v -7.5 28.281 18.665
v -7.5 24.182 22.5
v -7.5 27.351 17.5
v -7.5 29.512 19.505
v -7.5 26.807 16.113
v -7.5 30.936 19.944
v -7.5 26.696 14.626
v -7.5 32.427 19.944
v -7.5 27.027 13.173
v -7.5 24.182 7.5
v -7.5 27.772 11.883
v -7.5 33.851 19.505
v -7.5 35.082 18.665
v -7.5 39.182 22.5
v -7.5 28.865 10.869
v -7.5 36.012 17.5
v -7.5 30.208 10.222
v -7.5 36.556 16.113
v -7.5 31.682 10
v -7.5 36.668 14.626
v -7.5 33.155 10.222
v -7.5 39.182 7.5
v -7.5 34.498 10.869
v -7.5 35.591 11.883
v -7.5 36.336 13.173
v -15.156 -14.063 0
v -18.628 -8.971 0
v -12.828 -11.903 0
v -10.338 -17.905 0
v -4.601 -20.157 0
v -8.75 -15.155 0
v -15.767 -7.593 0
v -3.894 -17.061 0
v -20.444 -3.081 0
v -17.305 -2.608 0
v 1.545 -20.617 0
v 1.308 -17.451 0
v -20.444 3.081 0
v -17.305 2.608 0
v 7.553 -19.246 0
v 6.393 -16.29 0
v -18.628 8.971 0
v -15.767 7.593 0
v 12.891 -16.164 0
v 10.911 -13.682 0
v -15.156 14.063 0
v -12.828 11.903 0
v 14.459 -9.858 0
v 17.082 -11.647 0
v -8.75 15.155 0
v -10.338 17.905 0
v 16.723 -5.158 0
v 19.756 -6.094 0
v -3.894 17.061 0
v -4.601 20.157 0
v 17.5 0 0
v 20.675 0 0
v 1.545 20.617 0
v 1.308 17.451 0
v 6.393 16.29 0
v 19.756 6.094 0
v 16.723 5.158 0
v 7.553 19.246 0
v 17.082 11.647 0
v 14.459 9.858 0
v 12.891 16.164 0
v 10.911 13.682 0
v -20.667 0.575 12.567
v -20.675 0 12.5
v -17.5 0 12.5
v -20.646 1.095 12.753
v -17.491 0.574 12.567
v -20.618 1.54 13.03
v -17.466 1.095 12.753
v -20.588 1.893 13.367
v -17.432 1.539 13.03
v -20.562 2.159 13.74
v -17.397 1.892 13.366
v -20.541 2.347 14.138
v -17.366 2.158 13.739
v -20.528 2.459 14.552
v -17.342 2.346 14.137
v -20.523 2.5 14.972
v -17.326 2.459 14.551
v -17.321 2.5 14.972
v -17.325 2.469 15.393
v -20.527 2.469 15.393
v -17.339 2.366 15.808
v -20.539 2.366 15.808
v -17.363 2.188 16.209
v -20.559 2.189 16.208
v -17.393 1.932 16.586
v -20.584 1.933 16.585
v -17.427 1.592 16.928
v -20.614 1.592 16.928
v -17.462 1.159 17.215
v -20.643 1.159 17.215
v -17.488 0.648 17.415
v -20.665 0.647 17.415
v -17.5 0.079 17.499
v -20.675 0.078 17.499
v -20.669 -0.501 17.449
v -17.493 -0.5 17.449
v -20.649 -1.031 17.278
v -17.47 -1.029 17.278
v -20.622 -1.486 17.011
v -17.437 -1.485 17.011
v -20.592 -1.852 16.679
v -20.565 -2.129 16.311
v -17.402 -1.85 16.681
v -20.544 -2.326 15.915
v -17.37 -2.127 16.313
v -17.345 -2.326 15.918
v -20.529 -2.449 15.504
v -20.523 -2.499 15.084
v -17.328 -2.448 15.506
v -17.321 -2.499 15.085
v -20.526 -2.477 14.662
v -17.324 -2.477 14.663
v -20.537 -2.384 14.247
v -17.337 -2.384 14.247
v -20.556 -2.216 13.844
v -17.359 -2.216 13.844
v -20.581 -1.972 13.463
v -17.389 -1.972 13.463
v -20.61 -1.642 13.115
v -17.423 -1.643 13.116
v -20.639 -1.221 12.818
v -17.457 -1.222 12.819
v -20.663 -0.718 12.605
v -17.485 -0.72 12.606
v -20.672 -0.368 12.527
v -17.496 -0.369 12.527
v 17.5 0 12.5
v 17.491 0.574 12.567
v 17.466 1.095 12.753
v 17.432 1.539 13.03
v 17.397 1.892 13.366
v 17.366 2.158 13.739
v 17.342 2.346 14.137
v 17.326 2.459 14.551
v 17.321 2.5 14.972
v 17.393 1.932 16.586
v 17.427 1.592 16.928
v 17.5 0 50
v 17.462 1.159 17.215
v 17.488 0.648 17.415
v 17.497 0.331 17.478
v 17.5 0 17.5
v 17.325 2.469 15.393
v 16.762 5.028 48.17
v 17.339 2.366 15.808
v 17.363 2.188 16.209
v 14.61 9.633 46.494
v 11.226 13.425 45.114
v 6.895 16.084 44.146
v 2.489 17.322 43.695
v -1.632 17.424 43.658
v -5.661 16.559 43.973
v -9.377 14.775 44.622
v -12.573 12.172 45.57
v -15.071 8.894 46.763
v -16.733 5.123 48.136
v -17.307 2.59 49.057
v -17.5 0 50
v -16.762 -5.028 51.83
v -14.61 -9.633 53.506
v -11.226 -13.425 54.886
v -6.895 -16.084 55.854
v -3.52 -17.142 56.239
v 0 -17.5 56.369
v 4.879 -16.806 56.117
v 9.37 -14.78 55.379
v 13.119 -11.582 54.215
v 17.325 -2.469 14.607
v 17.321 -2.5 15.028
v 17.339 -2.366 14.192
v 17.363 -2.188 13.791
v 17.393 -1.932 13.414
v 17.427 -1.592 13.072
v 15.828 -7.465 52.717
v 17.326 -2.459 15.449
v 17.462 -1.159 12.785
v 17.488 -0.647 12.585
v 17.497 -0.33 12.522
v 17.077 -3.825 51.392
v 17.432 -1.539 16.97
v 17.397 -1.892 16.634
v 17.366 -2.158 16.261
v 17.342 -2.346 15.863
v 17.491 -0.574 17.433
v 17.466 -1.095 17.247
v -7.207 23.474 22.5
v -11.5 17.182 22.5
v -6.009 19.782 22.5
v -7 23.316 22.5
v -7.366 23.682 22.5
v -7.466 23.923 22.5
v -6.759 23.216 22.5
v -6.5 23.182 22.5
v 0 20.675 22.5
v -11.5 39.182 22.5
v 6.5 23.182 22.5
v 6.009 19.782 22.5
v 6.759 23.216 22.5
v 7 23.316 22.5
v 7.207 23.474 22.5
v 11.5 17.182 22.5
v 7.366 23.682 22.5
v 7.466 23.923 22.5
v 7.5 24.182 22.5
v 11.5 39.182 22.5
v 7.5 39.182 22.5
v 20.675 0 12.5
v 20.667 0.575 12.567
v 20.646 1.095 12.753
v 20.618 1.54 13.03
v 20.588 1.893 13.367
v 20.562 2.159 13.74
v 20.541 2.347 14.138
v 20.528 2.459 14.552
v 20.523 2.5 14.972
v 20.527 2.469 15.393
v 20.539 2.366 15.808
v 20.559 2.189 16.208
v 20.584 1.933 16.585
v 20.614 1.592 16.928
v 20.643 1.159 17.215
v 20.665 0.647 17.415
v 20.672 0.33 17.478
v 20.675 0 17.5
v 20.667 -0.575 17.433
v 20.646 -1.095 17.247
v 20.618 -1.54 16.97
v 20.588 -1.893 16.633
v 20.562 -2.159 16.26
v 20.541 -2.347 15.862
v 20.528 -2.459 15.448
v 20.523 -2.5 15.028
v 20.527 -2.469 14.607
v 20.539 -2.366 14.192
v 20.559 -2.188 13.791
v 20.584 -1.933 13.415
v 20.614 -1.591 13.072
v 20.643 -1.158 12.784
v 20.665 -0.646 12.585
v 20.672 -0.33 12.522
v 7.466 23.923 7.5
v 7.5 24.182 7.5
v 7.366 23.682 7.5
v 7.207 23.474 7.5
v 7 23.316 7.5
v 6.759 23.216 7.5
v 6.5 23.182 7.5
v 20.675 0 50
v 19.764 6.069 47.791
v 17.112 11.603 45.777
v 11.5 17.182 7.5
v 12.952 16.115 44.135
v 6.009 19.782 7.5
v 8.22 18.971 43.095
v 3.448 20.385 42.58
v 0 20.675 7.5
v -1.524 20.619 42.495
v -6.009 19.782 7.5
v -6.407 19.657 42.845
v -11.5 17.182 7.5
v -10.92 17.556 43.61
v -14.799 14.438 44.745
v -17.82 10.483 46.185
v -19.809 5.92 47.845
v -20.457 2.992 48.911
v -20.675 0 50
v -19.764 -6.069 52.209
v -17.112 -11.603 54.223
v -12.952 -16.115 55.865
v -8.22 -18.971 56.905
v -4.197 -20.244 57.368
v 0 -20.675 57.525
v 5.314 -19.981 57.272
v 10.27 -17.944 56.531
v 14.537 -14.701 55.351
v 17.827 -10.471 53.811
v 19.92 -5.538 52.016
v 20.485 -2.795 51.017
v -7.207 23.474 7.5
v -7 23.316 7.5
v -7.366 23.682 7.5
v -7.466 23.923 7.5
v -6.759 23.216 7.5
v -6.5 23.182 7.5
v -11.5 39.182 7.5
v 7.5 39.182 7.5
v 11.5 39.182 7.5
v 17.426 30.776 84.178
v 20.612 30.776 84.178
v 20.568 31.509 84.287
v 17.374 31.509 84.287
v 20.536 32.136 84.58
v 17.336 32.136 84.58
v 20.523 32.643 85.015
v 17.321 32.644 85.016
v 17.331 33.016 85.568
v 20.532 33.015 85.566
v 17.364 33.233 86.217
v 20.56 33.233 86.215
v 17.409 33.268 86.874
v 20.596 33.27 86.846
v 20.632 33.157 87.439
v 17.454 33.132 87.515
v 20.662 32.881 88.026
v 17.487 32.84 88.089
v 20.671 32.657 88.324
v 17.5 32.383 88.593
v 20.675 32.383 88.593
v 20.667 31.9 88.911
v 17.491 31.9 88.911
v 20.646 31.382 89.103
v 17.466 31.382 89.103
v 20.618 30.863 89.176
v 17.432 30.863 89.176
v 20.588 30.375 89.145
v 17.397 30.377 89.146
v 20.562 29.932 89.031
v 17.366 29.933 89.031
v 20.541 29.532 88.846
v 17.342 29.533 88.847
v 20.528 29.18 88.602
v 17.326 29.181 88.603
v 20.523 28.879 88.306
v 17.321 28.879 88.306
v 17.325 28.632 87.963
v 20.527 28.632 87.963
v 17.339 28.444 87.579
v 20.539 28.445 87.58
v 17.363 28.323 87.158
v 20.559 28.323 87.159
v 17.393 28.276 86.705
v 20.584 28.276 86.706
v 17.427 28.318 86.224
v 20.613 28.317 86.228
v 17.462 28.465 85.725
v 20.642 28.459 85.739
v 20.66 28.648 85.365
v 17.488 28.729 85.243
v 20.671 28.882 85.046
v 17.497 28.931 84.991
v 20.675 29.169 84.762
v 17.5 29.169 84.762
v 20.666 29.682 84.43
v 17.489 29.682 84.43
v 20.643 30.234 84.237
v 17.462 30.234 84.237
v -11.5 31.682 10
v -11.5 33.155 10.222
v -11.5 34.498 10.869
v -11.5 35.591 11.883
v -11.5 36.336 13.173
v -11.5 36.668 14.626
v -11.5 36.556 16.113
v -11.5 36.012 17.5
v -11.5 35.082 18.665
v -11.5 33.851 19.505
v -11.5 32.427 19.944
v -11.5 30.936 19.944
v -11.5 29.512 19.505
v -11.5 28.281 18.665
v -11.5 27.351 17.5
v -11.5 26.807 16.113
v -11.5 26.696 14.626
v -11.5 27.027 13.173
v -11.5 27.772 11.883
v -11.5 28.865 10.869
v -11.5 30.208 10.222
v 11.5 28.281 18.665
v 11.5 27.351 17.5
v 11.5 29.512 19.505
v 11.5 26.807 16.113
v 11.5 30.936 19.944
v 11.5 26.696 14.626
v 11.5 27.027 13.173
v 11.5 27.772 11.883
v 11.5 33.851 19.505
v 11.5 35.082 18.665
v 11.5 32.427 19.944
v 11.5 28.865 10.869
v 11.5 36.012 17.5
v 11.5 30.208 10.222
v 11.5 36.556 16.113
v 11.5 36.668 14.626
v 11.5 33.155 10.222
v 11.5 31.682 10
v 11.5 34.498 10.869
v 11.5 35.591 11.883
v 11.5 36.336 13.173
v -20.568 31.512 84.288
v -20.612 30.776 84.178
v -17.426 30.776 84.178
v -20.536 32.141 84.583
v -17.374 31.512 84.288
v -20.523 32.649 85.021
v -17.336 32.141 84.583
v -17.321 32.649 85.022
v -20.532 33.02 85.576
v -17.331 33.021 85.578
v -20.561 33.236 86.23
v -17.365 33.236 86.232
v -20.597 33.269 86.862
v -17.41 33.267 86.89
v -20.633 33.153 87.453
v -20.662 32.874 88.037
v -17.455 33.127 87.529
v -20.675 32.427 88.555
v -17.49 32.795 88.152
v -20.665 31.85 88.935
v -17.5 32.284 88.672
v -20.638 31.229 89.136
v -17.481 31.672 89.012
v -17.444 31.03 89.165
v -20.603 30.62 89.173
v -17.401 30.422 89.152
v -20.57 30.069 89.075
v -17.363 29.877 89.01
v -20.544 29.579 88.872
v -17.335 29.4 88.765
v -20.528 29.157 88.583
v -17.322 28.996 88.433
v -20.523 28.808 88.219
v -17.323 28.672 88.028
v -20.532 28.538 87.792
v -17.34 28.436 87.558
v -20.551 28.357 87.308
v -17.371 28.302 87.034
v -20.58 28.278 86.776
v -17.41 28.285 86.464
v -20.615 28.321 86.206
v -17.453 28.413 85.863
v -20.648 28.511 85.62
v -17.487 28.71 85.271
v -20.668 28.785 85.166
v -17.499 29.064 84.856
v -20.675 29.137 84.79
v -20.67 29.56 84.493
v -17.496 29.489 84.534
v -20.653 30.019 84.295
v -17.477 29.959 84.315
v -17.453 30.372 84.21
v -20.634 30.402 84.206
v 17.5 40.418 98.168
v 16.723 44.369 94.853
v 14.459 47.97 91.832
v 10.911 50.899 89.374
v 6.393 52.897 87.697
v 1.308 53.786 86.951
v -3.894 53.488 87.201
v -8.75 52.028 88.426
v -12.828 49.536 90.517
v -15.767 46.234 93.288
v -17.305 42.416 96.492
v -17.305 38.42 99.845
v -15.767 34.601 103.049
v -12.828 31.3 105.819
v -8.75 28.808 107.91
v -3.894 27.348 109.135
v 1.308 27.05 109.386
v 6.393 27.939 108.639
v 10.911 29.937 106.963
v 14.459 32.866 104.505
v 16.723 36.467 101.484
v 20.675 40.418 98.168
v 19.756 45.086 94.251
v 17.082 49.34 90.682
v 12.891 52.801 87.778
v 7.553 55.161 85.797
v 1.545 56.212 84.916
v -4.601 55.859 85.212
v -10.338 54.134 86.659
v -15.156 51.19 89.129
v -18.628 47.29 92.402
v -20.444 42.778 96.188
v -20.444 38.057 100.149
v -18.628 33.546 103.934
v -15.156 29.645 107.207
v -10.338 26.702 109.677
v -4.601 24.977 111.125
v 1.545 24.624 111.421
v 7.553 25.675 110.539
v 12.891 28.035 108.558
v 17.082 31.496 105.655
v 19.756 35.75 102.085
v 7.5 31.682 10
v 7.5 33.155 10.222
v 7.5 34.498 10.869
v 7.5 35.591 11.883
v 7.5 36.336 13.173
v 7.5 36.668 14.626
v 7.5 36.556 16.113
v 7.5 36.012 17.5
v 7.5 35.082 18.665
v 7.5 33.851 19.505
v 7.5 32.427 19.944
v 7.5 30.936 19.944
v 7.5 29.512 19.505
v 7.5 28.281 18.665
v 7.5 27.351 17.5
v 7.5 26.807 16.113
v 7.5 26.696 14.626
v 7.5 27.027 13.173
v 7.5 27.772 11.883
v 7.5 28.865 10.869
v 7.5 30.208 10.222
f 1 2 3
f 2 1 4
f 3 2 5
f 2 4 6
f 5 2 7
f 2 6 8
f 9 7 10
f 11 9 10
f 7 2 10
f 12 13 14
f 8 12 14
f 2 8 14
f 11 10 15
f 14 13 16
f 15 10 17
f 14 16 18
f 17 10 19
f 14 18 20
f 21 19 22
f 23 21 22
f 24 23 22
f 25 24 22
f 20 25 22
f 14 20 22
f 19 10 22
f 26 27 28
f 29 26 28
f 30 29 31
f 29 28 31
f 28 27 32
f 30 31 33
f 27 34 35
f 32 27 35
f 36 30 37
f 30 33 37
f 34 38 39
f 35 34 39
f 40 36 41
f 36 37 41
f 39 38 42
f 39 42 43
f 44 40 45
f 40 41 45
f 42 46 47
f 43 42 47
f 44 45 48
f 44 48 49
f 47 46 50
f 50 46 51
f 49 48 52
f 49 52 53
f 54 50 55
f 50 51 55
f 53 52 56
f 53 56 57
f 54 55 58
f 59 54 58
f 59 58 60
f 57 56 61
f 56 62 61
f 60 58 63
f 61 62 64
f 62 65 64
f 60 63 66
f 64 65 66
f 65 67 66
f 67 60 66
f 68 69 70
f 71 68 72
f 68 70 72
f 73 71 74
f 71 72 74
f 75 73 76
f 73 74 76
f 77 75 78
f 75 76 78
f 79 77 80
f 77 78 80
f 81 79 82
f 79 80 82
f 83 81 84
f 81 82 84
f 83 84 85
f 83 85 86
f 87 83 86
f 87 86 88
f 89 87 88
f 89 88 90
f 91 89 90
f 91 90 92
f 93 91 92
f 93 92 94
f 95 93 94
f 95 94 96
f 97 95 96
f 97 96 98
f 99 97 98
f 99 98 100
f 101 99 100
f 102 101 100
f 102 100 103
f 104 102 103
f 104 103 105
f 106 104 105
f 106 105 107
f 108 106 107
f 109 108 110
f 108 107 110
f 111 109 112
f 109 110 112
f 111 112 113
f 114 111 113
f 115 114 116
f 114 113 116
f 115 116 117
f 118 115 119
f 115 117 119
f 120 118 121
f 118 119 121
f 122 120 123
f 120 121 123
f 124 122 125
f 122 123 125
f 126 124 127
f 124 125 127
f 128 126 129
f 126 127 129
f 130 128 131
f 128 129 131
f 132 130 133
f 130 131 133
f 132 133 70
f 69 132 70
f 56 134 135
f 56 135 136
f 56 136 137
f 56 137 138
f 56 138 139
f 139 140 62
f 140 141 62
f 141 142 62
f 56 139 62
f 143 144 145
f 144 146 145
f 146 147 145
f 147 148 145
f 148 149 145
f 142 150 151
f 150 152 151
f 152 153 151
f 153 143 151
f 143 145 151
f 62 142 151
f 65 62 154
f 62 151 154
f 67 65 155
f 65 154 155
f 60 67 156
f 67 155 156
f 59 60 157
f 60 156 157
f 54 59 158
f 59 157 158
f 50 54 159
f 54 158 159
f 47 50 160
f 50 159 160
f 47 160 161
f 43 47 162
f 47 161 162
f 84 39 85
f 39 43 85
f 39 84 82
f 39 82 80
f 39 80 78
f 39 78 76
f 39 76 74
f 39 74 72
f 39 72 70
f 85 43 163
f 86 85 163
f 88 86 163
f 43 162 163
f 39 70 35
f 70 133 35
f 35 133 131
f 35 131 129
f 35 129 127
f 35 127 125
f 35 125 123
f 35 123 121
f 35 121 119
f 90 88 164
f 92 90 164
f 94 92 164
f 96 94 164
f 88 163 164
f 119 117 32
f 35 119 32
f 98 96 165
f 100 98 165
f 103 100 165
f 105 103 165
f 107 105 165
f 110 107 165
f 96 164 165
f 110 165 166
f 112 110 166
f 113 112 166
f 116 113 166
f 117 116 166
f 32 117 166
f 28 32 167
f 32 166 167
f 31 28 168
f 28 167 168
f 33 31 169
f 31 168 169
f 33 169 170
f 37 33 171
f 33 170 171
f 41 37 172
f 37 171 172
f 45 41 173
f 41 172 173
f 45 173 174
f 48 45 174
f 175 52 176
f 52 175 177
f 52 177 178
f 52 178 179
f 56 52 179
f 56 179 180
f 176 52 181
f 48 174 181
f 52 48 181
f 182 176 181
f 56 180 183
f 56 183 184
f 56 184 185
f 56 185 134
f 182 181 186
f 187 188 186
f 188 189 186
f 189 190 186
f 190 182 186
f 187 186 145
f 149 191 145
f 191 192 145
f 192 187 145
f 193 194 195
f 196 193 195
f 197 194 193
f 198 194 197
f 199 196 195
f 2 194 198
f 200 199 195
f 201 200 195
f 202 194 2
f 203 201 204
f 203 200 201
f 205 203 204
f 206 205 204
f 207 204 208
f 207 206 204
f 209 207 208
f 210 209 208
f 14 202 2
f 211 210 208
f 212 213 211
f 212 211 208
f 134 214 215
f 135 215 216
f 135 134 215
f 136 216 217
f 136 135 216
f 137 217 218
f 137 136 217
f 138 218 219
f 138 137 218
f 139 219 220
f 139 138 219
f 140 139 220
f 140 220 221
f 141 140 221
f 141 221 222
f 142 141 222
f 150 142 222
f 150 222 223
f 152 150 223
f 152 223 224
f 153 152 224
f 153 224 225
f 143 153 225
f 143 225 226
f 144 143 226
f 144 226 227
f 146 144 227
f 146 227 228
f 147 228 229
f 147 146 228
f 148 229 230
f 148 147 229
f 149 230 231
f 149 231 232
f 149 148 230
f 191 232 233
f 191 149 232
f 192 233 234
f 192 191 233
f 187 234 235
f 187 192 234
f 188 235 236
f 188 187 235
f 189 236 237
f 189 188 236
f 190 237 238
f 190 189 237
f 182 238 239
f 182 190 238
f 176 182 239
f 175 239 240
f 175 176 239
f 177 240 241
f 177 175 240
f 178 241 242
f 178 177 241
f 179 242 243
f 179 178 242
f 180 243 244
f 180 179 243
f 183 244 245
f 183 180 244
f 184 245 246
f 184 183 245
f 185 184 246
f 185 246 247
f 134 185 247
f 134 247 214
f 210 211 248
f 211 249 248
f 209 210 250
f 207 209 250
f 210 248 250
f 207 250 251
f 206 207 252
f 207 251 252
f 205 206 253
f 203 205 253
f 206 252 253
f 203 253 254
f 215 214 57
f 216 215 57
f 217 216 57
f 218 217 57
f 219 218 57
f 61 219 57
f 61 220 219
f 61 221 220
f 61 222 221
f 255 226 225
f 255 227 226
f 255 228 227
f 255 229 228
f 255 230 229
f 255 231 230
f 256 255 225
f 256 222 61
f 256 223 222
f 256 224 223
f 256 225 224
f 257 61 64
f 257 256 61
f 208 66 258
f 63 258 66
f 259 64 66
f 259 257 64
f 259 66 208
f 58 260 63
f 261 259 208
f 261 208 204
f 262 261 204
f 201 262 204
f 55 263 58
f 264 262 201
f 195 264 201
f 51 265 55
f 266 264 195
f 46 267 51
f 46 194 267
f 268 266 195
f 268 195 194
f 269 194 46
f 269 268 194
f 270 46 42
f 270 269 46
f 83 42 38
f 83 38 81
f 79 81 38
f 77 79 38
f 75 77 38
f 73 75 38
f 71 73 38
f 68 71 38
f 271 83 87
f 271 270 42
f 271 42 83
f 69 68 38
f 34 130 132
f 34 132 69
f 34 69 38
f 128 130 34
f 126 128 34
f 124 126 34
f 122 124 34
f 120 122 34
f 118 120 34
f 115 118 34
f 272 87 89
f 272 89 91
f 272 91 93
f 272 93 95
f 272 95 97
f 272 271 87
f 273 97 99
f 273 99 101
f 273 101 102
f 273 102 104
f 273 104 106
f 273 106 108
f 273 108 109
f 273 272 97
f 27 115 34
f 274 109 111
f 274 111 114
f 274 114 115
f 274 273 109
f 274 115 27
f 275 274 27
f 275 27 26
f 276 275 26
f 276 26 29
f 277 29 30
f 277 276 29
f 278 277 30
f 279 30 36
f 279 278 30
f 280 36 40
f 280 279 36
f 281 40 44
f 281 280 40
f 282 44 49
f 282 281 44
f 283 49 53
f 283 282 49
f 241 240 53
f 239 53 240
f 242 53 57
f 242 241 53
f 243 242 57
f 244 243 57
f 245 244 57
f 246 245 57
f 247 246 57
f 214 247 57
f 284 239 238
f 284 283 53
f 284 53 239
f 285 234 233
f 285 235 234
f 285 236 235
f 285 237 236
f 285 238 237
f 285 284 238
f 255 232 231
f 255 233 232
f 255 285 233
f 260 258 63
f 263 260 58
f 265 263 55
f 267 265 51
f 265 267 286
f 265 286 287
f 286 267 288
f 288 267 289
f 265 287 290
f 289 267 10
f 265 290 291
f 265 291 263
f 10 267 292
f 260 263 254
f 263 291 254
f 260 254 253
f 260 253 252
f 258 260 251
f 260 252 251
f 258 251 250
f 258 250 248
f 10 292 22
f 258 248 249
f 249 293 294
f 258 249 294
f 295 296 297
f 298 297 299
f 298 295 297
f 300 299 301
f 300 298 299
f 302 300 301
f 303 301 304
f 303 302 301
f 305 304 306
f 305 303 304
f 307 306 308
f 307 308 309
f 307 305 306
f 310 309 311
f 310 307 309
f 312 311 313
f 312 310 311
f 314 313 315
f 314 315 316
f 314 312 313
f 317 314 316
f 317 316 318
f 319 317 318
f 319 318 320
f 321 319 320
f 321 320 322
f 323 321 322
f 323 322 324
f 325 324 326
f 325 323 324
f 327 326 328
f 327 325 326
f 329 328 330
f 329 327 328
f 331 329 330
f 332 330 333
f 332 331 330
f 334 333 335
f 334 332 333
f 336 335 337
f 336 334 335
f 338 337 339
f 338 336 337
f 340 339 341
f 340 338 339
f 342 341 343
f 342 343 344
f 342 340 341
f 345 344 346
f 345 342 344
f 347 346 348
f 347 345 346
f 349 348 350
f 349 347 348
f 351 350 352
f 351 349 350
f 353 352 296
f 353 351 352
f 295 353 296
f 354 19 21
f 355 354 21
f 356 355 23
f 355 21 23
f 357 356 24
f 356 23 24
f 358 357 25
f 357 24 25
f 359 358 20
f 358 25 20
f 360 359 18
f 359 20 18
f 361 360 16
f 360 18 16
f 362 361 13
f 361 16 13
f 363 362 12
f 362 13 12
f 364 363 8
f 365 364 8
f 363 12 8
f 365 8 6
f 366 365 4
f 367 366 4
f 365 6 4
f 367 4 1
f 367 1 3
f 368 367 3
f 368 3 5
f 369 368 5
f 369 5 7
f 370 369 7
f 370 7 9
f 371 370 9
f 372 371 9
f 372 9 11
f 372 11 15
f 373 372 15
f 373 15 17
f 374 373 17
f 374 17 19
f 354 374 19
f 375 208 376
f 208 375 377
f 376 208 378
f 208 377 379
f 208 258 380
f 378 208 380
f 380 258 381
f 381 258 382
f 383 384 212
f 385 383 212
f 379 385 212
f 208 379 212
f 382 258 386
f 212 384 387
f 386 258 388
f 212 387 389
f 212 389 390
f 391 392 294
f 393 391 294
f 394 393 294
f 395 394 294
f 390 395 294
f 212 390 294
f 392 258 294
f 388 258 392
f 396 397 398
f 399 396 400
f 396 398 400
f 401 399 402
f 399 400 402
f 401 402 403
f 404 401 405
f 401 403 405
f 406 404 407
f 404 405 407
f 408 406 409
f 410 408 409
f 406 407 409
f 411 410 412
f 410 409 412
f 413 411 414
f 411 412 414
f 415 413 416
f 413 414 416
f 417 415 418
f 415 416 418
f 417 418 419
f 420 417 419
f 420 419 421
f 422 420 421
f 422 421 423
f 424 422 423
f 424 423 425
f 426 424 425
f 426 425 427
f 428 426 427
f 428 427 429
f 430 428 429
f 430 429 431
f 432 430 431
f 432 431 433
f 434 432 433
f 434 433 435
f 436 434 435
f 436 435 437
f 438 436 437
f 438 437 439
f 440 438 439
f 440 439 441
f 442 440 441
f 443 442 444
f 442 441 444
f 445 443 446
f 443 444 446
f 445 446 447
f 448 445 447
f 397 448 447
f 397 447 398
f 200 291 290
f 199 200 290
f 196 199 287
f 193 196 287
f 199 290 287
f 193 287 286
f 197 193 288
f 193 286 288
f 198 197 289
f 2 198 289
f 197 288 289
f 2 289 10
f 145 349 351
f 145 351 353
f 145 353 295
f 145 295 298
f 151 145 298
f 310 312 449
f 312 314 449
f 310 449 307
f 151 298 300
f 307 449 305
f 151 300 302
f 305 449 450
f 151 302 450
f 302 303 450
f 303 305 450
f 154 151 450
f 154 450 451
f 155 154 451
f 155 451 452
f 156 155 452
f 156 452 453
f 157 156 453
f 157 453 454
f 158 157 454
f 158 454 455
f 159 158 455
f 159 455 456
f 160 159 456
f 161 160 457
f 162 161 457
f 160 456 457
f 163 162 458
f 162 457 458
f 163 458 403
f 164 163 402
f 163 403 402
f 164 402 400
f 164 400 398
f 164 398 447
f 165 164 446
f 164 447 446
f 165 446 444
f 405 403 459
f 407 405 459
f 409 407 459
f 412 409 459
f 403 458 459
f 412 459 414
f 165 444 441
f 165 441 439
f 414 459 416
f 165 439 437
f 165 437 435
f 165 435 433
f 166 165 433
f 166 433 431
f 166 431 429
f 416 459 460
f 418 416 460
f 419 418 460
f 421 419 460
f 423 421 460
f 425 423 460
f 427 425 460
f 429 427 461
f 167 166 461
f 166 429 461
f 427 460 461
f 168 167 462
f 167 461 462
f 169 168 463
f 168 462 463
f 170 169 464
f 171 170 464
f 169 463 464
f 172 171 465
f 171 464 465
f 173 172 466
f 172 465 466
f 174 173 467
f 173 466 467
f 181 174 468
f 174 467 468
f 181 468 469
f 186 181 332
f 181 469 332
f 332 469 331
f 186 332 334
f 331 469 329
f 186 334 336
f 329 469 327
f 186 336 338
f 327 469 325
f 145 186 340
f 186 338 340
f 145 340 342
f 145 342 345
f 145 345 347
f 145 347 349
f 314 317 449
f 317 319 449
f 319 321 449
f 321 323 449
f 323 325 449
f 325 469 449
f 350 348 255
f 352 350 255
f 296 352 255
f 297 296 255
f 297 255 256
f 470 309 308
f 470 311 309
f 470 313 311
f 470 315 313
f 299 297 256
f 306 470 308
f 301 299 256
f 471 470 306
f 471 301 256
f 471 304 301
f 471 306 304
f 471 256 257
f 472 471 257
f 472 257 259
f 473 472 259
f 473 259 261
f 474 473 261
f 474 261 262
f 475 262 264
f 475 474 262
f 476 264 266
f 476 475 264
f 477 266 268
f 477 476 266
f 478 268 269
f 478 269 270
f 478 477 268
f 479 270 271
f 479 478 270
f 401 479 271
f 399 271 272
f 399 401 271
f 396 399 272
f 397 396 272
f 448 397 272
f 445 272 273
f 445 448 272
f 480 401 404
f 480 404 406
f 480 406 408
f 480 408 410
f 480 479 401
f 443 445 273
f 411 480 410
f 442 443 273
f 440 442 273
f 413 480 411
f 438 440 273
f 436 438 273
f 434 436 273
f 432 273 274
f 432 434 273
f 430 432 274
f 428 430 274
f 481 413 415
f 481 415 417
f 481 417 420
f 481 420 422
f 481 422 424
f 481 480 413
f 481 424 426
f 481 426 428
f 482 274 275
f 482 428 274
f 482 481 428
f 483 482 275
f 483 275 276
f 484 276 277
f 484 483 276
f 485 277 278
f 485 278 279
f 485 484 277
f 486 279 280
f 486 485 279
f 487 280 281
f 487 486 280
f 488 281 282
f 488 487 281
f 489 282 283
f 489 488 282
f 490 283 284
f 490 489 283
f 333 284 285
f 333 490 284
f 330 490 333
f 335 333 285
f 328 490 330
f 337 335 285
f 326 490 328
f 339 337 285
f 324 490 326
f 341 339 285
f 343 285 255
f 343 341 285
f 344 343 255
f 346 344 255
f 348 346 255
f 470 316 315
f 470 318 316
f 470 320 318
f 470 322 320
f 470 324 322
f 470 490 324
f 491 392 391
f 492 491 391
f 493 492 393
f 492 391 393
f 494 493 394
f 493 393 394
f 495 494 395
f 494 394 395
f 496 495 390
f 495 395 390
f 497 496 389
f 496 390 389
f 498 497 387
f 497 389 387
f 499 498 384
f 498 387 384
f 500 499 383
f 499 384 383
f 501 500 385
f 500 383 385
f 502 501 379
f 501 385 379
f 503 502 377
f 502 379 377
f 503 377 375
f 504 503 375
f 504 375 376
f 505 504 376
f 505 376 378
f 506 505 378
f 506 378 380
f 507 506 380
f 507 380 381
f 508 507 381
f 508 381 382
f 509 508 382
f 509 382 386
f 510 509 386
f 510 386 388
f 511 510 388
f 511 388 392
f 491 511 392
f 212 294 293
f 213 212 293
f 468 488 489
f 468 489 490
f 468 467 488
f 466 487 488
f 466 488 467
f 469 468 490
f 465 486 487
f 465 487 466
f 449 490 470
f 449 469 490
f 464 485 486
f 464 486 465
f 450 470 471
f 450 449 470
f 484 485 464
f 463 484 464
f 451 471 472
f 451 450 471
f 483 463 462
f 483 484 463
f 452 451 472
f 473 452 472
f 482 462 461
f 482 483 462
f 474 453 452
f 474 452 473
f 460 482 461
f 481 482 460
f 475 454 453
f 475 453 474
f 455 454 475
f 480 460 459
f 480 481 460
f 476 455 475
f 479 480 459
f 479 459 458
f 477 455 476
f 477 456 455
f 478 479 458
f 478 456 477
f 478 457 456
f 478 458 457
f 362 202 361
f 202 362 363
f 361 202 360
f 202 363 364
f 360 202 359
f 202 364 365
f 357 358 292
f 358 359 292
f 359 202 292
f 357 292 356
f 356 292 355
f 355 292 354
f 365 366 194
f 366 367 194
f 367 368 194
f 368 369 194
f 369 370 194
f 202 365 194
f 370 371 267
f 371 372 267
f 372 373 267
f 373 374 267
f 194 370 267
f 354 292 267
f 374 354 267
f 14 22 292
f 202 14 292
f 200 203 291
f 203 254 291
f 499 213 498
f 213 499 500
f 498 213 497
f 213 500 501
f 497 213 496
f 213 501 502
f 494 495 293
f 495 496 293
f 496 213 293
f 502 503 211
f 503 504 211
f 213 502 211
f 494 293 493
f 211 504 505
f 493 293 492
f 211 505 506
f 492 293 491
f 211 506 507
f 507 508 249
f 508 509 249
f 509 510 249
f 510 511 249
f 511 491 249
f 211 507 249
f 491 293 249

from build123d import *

# Parameters (mm, degrees)
SKETCH1_R                = 20.675
SKETCH1_R_2              = 17.5
SKETCH3_R                = 2.5
CUT_EXTRUDE1_DEPTH       = 21.675
CUT_EXTRUDE1_DEPTH_BACK  = 21.675
BOSS_EXTRUDE1_DEPTH      = 7.5
BOSS_EXTRUDE1_DEPTH_BACK = 7.5
SKETCH5_R                = 5
CUT_EXTRUDE2_DEPTH       = 10.1750001
CUT_EXTRUDE2_DEPTH_BACK  = 33.1750001


with BuildPart() as part:
    # Sweep1: sweep along a path in Sketch2
    with BuildLine(Plane(origin=(0, 0, 0), x_dir=(0, 0, -1), z_dir=(1, 0, 0))) as sweep1_path:
        Line((0, 0), (-50, 0))
        Line((-50, 0), (-98.168231432, 40.417945229))
    # Sketch1 → Sweep1 (sweep)
    with BuildSketch(Plane.XY):
        Circle(SKETCH1_R)
        Circle(SKETCH1_R_2, mode=Mode.SUBTRACT)
    sweep(path=sweep1_path.line, transition=Transition.RIGHT)

    # Sketch3 → Cut-Extrude1 (cut, two sides)
    with BuildSketch(Plane(origin=(0, 0, 0), x_dir=(0, 0, -1), z_dir=(1, 0, 0))) as cut_extrude1_sk:
        with Locations((-86.677564785, 30.776131084)):
            Circle(SKETCH3_R)
        with Locations((-15, 0)):
            Circle(SKETCH3_R)
    extrude(amount=CUT_EXTRUDE1_DEPTH, mode=Mode.SUBTRACT)
    extrude(cut_extrude1_sk.sketch, amount=-CUT_EXTRUDE1_DEPTH_BACK, mode=Mode.SUBTRACT)

    # Sketch4 → Boss-Extrude1 (add, two sides)
    with BuildSketch(Plane(origin=(0, 0, 15), x_dir=(-1, 0, 0), z_dir=(0, 0, -1))) as boss_extrude1_sk:
        with BuildLine():
            Line((-11.5, 39.18154897), (-7.5, 39.18154897))
            Line((-7.5, 39.18154897), (-7.5, 24.18154897))
            ThreePointArc((-7.5, 24.18154897), (-7.207106781, 23.474442189), (-6.5, 23.18154897))
            Line((-6.5, 23.18154897), (6.5, 23.18154897))
            ThreePointArc((6.5, 23.18154897), (7.207106781, 23.474442189), (7.5, 24.18154897))
            Line((7.5, 24.18154897), (7.5, 39.18154897))
            Line((7.5, 39.18154897), (11.5, 39.18154897))
            Line((11.5, 39.18154897), (11.5, 17.18154897))
            Line((11.5, 17.18154897), (8.31426673, 17.18154897))
            ThreePointArc((8.31426673, 17.18154897), (0, 19.0875), (-8.31426673, 17.18154897))
            Line((-8.31426673, 17.18154897), (-11.5, 17.18154897))
            Line((-11.5, 17.18154897), (-11.5, 39.18154897))
        make_face()
    extrude(amount=BOSS_EXTRUDE1_DEPTH)
    extrude(boss_extrude1_sk.sketch, amount=-BOSS_EXTRUDE1_DEPTH_BACK)

    # Sketch5 → Cut-Extrude2 (cut, two sides)
    with BuildSketch(Plane(origin=(11.5, 0, 0), x_dir=(0, 0, -1), z_dir=(1, 0, 0))) as cut_extrude2_sk:
        with Locations((-15, 31.68154897)):
            Circle(SKETCH5_R)
    extrude(amount=CUT_EXTRUDE2_DEPTH, mode=Mode.SUBTRACT)
    extrude(cut_extrude2_sk.sketch, amount=-CUT_EXTRUDE2_DEPTH_BACK, mode=Mode.SUBTRACT)


solid = part.part
